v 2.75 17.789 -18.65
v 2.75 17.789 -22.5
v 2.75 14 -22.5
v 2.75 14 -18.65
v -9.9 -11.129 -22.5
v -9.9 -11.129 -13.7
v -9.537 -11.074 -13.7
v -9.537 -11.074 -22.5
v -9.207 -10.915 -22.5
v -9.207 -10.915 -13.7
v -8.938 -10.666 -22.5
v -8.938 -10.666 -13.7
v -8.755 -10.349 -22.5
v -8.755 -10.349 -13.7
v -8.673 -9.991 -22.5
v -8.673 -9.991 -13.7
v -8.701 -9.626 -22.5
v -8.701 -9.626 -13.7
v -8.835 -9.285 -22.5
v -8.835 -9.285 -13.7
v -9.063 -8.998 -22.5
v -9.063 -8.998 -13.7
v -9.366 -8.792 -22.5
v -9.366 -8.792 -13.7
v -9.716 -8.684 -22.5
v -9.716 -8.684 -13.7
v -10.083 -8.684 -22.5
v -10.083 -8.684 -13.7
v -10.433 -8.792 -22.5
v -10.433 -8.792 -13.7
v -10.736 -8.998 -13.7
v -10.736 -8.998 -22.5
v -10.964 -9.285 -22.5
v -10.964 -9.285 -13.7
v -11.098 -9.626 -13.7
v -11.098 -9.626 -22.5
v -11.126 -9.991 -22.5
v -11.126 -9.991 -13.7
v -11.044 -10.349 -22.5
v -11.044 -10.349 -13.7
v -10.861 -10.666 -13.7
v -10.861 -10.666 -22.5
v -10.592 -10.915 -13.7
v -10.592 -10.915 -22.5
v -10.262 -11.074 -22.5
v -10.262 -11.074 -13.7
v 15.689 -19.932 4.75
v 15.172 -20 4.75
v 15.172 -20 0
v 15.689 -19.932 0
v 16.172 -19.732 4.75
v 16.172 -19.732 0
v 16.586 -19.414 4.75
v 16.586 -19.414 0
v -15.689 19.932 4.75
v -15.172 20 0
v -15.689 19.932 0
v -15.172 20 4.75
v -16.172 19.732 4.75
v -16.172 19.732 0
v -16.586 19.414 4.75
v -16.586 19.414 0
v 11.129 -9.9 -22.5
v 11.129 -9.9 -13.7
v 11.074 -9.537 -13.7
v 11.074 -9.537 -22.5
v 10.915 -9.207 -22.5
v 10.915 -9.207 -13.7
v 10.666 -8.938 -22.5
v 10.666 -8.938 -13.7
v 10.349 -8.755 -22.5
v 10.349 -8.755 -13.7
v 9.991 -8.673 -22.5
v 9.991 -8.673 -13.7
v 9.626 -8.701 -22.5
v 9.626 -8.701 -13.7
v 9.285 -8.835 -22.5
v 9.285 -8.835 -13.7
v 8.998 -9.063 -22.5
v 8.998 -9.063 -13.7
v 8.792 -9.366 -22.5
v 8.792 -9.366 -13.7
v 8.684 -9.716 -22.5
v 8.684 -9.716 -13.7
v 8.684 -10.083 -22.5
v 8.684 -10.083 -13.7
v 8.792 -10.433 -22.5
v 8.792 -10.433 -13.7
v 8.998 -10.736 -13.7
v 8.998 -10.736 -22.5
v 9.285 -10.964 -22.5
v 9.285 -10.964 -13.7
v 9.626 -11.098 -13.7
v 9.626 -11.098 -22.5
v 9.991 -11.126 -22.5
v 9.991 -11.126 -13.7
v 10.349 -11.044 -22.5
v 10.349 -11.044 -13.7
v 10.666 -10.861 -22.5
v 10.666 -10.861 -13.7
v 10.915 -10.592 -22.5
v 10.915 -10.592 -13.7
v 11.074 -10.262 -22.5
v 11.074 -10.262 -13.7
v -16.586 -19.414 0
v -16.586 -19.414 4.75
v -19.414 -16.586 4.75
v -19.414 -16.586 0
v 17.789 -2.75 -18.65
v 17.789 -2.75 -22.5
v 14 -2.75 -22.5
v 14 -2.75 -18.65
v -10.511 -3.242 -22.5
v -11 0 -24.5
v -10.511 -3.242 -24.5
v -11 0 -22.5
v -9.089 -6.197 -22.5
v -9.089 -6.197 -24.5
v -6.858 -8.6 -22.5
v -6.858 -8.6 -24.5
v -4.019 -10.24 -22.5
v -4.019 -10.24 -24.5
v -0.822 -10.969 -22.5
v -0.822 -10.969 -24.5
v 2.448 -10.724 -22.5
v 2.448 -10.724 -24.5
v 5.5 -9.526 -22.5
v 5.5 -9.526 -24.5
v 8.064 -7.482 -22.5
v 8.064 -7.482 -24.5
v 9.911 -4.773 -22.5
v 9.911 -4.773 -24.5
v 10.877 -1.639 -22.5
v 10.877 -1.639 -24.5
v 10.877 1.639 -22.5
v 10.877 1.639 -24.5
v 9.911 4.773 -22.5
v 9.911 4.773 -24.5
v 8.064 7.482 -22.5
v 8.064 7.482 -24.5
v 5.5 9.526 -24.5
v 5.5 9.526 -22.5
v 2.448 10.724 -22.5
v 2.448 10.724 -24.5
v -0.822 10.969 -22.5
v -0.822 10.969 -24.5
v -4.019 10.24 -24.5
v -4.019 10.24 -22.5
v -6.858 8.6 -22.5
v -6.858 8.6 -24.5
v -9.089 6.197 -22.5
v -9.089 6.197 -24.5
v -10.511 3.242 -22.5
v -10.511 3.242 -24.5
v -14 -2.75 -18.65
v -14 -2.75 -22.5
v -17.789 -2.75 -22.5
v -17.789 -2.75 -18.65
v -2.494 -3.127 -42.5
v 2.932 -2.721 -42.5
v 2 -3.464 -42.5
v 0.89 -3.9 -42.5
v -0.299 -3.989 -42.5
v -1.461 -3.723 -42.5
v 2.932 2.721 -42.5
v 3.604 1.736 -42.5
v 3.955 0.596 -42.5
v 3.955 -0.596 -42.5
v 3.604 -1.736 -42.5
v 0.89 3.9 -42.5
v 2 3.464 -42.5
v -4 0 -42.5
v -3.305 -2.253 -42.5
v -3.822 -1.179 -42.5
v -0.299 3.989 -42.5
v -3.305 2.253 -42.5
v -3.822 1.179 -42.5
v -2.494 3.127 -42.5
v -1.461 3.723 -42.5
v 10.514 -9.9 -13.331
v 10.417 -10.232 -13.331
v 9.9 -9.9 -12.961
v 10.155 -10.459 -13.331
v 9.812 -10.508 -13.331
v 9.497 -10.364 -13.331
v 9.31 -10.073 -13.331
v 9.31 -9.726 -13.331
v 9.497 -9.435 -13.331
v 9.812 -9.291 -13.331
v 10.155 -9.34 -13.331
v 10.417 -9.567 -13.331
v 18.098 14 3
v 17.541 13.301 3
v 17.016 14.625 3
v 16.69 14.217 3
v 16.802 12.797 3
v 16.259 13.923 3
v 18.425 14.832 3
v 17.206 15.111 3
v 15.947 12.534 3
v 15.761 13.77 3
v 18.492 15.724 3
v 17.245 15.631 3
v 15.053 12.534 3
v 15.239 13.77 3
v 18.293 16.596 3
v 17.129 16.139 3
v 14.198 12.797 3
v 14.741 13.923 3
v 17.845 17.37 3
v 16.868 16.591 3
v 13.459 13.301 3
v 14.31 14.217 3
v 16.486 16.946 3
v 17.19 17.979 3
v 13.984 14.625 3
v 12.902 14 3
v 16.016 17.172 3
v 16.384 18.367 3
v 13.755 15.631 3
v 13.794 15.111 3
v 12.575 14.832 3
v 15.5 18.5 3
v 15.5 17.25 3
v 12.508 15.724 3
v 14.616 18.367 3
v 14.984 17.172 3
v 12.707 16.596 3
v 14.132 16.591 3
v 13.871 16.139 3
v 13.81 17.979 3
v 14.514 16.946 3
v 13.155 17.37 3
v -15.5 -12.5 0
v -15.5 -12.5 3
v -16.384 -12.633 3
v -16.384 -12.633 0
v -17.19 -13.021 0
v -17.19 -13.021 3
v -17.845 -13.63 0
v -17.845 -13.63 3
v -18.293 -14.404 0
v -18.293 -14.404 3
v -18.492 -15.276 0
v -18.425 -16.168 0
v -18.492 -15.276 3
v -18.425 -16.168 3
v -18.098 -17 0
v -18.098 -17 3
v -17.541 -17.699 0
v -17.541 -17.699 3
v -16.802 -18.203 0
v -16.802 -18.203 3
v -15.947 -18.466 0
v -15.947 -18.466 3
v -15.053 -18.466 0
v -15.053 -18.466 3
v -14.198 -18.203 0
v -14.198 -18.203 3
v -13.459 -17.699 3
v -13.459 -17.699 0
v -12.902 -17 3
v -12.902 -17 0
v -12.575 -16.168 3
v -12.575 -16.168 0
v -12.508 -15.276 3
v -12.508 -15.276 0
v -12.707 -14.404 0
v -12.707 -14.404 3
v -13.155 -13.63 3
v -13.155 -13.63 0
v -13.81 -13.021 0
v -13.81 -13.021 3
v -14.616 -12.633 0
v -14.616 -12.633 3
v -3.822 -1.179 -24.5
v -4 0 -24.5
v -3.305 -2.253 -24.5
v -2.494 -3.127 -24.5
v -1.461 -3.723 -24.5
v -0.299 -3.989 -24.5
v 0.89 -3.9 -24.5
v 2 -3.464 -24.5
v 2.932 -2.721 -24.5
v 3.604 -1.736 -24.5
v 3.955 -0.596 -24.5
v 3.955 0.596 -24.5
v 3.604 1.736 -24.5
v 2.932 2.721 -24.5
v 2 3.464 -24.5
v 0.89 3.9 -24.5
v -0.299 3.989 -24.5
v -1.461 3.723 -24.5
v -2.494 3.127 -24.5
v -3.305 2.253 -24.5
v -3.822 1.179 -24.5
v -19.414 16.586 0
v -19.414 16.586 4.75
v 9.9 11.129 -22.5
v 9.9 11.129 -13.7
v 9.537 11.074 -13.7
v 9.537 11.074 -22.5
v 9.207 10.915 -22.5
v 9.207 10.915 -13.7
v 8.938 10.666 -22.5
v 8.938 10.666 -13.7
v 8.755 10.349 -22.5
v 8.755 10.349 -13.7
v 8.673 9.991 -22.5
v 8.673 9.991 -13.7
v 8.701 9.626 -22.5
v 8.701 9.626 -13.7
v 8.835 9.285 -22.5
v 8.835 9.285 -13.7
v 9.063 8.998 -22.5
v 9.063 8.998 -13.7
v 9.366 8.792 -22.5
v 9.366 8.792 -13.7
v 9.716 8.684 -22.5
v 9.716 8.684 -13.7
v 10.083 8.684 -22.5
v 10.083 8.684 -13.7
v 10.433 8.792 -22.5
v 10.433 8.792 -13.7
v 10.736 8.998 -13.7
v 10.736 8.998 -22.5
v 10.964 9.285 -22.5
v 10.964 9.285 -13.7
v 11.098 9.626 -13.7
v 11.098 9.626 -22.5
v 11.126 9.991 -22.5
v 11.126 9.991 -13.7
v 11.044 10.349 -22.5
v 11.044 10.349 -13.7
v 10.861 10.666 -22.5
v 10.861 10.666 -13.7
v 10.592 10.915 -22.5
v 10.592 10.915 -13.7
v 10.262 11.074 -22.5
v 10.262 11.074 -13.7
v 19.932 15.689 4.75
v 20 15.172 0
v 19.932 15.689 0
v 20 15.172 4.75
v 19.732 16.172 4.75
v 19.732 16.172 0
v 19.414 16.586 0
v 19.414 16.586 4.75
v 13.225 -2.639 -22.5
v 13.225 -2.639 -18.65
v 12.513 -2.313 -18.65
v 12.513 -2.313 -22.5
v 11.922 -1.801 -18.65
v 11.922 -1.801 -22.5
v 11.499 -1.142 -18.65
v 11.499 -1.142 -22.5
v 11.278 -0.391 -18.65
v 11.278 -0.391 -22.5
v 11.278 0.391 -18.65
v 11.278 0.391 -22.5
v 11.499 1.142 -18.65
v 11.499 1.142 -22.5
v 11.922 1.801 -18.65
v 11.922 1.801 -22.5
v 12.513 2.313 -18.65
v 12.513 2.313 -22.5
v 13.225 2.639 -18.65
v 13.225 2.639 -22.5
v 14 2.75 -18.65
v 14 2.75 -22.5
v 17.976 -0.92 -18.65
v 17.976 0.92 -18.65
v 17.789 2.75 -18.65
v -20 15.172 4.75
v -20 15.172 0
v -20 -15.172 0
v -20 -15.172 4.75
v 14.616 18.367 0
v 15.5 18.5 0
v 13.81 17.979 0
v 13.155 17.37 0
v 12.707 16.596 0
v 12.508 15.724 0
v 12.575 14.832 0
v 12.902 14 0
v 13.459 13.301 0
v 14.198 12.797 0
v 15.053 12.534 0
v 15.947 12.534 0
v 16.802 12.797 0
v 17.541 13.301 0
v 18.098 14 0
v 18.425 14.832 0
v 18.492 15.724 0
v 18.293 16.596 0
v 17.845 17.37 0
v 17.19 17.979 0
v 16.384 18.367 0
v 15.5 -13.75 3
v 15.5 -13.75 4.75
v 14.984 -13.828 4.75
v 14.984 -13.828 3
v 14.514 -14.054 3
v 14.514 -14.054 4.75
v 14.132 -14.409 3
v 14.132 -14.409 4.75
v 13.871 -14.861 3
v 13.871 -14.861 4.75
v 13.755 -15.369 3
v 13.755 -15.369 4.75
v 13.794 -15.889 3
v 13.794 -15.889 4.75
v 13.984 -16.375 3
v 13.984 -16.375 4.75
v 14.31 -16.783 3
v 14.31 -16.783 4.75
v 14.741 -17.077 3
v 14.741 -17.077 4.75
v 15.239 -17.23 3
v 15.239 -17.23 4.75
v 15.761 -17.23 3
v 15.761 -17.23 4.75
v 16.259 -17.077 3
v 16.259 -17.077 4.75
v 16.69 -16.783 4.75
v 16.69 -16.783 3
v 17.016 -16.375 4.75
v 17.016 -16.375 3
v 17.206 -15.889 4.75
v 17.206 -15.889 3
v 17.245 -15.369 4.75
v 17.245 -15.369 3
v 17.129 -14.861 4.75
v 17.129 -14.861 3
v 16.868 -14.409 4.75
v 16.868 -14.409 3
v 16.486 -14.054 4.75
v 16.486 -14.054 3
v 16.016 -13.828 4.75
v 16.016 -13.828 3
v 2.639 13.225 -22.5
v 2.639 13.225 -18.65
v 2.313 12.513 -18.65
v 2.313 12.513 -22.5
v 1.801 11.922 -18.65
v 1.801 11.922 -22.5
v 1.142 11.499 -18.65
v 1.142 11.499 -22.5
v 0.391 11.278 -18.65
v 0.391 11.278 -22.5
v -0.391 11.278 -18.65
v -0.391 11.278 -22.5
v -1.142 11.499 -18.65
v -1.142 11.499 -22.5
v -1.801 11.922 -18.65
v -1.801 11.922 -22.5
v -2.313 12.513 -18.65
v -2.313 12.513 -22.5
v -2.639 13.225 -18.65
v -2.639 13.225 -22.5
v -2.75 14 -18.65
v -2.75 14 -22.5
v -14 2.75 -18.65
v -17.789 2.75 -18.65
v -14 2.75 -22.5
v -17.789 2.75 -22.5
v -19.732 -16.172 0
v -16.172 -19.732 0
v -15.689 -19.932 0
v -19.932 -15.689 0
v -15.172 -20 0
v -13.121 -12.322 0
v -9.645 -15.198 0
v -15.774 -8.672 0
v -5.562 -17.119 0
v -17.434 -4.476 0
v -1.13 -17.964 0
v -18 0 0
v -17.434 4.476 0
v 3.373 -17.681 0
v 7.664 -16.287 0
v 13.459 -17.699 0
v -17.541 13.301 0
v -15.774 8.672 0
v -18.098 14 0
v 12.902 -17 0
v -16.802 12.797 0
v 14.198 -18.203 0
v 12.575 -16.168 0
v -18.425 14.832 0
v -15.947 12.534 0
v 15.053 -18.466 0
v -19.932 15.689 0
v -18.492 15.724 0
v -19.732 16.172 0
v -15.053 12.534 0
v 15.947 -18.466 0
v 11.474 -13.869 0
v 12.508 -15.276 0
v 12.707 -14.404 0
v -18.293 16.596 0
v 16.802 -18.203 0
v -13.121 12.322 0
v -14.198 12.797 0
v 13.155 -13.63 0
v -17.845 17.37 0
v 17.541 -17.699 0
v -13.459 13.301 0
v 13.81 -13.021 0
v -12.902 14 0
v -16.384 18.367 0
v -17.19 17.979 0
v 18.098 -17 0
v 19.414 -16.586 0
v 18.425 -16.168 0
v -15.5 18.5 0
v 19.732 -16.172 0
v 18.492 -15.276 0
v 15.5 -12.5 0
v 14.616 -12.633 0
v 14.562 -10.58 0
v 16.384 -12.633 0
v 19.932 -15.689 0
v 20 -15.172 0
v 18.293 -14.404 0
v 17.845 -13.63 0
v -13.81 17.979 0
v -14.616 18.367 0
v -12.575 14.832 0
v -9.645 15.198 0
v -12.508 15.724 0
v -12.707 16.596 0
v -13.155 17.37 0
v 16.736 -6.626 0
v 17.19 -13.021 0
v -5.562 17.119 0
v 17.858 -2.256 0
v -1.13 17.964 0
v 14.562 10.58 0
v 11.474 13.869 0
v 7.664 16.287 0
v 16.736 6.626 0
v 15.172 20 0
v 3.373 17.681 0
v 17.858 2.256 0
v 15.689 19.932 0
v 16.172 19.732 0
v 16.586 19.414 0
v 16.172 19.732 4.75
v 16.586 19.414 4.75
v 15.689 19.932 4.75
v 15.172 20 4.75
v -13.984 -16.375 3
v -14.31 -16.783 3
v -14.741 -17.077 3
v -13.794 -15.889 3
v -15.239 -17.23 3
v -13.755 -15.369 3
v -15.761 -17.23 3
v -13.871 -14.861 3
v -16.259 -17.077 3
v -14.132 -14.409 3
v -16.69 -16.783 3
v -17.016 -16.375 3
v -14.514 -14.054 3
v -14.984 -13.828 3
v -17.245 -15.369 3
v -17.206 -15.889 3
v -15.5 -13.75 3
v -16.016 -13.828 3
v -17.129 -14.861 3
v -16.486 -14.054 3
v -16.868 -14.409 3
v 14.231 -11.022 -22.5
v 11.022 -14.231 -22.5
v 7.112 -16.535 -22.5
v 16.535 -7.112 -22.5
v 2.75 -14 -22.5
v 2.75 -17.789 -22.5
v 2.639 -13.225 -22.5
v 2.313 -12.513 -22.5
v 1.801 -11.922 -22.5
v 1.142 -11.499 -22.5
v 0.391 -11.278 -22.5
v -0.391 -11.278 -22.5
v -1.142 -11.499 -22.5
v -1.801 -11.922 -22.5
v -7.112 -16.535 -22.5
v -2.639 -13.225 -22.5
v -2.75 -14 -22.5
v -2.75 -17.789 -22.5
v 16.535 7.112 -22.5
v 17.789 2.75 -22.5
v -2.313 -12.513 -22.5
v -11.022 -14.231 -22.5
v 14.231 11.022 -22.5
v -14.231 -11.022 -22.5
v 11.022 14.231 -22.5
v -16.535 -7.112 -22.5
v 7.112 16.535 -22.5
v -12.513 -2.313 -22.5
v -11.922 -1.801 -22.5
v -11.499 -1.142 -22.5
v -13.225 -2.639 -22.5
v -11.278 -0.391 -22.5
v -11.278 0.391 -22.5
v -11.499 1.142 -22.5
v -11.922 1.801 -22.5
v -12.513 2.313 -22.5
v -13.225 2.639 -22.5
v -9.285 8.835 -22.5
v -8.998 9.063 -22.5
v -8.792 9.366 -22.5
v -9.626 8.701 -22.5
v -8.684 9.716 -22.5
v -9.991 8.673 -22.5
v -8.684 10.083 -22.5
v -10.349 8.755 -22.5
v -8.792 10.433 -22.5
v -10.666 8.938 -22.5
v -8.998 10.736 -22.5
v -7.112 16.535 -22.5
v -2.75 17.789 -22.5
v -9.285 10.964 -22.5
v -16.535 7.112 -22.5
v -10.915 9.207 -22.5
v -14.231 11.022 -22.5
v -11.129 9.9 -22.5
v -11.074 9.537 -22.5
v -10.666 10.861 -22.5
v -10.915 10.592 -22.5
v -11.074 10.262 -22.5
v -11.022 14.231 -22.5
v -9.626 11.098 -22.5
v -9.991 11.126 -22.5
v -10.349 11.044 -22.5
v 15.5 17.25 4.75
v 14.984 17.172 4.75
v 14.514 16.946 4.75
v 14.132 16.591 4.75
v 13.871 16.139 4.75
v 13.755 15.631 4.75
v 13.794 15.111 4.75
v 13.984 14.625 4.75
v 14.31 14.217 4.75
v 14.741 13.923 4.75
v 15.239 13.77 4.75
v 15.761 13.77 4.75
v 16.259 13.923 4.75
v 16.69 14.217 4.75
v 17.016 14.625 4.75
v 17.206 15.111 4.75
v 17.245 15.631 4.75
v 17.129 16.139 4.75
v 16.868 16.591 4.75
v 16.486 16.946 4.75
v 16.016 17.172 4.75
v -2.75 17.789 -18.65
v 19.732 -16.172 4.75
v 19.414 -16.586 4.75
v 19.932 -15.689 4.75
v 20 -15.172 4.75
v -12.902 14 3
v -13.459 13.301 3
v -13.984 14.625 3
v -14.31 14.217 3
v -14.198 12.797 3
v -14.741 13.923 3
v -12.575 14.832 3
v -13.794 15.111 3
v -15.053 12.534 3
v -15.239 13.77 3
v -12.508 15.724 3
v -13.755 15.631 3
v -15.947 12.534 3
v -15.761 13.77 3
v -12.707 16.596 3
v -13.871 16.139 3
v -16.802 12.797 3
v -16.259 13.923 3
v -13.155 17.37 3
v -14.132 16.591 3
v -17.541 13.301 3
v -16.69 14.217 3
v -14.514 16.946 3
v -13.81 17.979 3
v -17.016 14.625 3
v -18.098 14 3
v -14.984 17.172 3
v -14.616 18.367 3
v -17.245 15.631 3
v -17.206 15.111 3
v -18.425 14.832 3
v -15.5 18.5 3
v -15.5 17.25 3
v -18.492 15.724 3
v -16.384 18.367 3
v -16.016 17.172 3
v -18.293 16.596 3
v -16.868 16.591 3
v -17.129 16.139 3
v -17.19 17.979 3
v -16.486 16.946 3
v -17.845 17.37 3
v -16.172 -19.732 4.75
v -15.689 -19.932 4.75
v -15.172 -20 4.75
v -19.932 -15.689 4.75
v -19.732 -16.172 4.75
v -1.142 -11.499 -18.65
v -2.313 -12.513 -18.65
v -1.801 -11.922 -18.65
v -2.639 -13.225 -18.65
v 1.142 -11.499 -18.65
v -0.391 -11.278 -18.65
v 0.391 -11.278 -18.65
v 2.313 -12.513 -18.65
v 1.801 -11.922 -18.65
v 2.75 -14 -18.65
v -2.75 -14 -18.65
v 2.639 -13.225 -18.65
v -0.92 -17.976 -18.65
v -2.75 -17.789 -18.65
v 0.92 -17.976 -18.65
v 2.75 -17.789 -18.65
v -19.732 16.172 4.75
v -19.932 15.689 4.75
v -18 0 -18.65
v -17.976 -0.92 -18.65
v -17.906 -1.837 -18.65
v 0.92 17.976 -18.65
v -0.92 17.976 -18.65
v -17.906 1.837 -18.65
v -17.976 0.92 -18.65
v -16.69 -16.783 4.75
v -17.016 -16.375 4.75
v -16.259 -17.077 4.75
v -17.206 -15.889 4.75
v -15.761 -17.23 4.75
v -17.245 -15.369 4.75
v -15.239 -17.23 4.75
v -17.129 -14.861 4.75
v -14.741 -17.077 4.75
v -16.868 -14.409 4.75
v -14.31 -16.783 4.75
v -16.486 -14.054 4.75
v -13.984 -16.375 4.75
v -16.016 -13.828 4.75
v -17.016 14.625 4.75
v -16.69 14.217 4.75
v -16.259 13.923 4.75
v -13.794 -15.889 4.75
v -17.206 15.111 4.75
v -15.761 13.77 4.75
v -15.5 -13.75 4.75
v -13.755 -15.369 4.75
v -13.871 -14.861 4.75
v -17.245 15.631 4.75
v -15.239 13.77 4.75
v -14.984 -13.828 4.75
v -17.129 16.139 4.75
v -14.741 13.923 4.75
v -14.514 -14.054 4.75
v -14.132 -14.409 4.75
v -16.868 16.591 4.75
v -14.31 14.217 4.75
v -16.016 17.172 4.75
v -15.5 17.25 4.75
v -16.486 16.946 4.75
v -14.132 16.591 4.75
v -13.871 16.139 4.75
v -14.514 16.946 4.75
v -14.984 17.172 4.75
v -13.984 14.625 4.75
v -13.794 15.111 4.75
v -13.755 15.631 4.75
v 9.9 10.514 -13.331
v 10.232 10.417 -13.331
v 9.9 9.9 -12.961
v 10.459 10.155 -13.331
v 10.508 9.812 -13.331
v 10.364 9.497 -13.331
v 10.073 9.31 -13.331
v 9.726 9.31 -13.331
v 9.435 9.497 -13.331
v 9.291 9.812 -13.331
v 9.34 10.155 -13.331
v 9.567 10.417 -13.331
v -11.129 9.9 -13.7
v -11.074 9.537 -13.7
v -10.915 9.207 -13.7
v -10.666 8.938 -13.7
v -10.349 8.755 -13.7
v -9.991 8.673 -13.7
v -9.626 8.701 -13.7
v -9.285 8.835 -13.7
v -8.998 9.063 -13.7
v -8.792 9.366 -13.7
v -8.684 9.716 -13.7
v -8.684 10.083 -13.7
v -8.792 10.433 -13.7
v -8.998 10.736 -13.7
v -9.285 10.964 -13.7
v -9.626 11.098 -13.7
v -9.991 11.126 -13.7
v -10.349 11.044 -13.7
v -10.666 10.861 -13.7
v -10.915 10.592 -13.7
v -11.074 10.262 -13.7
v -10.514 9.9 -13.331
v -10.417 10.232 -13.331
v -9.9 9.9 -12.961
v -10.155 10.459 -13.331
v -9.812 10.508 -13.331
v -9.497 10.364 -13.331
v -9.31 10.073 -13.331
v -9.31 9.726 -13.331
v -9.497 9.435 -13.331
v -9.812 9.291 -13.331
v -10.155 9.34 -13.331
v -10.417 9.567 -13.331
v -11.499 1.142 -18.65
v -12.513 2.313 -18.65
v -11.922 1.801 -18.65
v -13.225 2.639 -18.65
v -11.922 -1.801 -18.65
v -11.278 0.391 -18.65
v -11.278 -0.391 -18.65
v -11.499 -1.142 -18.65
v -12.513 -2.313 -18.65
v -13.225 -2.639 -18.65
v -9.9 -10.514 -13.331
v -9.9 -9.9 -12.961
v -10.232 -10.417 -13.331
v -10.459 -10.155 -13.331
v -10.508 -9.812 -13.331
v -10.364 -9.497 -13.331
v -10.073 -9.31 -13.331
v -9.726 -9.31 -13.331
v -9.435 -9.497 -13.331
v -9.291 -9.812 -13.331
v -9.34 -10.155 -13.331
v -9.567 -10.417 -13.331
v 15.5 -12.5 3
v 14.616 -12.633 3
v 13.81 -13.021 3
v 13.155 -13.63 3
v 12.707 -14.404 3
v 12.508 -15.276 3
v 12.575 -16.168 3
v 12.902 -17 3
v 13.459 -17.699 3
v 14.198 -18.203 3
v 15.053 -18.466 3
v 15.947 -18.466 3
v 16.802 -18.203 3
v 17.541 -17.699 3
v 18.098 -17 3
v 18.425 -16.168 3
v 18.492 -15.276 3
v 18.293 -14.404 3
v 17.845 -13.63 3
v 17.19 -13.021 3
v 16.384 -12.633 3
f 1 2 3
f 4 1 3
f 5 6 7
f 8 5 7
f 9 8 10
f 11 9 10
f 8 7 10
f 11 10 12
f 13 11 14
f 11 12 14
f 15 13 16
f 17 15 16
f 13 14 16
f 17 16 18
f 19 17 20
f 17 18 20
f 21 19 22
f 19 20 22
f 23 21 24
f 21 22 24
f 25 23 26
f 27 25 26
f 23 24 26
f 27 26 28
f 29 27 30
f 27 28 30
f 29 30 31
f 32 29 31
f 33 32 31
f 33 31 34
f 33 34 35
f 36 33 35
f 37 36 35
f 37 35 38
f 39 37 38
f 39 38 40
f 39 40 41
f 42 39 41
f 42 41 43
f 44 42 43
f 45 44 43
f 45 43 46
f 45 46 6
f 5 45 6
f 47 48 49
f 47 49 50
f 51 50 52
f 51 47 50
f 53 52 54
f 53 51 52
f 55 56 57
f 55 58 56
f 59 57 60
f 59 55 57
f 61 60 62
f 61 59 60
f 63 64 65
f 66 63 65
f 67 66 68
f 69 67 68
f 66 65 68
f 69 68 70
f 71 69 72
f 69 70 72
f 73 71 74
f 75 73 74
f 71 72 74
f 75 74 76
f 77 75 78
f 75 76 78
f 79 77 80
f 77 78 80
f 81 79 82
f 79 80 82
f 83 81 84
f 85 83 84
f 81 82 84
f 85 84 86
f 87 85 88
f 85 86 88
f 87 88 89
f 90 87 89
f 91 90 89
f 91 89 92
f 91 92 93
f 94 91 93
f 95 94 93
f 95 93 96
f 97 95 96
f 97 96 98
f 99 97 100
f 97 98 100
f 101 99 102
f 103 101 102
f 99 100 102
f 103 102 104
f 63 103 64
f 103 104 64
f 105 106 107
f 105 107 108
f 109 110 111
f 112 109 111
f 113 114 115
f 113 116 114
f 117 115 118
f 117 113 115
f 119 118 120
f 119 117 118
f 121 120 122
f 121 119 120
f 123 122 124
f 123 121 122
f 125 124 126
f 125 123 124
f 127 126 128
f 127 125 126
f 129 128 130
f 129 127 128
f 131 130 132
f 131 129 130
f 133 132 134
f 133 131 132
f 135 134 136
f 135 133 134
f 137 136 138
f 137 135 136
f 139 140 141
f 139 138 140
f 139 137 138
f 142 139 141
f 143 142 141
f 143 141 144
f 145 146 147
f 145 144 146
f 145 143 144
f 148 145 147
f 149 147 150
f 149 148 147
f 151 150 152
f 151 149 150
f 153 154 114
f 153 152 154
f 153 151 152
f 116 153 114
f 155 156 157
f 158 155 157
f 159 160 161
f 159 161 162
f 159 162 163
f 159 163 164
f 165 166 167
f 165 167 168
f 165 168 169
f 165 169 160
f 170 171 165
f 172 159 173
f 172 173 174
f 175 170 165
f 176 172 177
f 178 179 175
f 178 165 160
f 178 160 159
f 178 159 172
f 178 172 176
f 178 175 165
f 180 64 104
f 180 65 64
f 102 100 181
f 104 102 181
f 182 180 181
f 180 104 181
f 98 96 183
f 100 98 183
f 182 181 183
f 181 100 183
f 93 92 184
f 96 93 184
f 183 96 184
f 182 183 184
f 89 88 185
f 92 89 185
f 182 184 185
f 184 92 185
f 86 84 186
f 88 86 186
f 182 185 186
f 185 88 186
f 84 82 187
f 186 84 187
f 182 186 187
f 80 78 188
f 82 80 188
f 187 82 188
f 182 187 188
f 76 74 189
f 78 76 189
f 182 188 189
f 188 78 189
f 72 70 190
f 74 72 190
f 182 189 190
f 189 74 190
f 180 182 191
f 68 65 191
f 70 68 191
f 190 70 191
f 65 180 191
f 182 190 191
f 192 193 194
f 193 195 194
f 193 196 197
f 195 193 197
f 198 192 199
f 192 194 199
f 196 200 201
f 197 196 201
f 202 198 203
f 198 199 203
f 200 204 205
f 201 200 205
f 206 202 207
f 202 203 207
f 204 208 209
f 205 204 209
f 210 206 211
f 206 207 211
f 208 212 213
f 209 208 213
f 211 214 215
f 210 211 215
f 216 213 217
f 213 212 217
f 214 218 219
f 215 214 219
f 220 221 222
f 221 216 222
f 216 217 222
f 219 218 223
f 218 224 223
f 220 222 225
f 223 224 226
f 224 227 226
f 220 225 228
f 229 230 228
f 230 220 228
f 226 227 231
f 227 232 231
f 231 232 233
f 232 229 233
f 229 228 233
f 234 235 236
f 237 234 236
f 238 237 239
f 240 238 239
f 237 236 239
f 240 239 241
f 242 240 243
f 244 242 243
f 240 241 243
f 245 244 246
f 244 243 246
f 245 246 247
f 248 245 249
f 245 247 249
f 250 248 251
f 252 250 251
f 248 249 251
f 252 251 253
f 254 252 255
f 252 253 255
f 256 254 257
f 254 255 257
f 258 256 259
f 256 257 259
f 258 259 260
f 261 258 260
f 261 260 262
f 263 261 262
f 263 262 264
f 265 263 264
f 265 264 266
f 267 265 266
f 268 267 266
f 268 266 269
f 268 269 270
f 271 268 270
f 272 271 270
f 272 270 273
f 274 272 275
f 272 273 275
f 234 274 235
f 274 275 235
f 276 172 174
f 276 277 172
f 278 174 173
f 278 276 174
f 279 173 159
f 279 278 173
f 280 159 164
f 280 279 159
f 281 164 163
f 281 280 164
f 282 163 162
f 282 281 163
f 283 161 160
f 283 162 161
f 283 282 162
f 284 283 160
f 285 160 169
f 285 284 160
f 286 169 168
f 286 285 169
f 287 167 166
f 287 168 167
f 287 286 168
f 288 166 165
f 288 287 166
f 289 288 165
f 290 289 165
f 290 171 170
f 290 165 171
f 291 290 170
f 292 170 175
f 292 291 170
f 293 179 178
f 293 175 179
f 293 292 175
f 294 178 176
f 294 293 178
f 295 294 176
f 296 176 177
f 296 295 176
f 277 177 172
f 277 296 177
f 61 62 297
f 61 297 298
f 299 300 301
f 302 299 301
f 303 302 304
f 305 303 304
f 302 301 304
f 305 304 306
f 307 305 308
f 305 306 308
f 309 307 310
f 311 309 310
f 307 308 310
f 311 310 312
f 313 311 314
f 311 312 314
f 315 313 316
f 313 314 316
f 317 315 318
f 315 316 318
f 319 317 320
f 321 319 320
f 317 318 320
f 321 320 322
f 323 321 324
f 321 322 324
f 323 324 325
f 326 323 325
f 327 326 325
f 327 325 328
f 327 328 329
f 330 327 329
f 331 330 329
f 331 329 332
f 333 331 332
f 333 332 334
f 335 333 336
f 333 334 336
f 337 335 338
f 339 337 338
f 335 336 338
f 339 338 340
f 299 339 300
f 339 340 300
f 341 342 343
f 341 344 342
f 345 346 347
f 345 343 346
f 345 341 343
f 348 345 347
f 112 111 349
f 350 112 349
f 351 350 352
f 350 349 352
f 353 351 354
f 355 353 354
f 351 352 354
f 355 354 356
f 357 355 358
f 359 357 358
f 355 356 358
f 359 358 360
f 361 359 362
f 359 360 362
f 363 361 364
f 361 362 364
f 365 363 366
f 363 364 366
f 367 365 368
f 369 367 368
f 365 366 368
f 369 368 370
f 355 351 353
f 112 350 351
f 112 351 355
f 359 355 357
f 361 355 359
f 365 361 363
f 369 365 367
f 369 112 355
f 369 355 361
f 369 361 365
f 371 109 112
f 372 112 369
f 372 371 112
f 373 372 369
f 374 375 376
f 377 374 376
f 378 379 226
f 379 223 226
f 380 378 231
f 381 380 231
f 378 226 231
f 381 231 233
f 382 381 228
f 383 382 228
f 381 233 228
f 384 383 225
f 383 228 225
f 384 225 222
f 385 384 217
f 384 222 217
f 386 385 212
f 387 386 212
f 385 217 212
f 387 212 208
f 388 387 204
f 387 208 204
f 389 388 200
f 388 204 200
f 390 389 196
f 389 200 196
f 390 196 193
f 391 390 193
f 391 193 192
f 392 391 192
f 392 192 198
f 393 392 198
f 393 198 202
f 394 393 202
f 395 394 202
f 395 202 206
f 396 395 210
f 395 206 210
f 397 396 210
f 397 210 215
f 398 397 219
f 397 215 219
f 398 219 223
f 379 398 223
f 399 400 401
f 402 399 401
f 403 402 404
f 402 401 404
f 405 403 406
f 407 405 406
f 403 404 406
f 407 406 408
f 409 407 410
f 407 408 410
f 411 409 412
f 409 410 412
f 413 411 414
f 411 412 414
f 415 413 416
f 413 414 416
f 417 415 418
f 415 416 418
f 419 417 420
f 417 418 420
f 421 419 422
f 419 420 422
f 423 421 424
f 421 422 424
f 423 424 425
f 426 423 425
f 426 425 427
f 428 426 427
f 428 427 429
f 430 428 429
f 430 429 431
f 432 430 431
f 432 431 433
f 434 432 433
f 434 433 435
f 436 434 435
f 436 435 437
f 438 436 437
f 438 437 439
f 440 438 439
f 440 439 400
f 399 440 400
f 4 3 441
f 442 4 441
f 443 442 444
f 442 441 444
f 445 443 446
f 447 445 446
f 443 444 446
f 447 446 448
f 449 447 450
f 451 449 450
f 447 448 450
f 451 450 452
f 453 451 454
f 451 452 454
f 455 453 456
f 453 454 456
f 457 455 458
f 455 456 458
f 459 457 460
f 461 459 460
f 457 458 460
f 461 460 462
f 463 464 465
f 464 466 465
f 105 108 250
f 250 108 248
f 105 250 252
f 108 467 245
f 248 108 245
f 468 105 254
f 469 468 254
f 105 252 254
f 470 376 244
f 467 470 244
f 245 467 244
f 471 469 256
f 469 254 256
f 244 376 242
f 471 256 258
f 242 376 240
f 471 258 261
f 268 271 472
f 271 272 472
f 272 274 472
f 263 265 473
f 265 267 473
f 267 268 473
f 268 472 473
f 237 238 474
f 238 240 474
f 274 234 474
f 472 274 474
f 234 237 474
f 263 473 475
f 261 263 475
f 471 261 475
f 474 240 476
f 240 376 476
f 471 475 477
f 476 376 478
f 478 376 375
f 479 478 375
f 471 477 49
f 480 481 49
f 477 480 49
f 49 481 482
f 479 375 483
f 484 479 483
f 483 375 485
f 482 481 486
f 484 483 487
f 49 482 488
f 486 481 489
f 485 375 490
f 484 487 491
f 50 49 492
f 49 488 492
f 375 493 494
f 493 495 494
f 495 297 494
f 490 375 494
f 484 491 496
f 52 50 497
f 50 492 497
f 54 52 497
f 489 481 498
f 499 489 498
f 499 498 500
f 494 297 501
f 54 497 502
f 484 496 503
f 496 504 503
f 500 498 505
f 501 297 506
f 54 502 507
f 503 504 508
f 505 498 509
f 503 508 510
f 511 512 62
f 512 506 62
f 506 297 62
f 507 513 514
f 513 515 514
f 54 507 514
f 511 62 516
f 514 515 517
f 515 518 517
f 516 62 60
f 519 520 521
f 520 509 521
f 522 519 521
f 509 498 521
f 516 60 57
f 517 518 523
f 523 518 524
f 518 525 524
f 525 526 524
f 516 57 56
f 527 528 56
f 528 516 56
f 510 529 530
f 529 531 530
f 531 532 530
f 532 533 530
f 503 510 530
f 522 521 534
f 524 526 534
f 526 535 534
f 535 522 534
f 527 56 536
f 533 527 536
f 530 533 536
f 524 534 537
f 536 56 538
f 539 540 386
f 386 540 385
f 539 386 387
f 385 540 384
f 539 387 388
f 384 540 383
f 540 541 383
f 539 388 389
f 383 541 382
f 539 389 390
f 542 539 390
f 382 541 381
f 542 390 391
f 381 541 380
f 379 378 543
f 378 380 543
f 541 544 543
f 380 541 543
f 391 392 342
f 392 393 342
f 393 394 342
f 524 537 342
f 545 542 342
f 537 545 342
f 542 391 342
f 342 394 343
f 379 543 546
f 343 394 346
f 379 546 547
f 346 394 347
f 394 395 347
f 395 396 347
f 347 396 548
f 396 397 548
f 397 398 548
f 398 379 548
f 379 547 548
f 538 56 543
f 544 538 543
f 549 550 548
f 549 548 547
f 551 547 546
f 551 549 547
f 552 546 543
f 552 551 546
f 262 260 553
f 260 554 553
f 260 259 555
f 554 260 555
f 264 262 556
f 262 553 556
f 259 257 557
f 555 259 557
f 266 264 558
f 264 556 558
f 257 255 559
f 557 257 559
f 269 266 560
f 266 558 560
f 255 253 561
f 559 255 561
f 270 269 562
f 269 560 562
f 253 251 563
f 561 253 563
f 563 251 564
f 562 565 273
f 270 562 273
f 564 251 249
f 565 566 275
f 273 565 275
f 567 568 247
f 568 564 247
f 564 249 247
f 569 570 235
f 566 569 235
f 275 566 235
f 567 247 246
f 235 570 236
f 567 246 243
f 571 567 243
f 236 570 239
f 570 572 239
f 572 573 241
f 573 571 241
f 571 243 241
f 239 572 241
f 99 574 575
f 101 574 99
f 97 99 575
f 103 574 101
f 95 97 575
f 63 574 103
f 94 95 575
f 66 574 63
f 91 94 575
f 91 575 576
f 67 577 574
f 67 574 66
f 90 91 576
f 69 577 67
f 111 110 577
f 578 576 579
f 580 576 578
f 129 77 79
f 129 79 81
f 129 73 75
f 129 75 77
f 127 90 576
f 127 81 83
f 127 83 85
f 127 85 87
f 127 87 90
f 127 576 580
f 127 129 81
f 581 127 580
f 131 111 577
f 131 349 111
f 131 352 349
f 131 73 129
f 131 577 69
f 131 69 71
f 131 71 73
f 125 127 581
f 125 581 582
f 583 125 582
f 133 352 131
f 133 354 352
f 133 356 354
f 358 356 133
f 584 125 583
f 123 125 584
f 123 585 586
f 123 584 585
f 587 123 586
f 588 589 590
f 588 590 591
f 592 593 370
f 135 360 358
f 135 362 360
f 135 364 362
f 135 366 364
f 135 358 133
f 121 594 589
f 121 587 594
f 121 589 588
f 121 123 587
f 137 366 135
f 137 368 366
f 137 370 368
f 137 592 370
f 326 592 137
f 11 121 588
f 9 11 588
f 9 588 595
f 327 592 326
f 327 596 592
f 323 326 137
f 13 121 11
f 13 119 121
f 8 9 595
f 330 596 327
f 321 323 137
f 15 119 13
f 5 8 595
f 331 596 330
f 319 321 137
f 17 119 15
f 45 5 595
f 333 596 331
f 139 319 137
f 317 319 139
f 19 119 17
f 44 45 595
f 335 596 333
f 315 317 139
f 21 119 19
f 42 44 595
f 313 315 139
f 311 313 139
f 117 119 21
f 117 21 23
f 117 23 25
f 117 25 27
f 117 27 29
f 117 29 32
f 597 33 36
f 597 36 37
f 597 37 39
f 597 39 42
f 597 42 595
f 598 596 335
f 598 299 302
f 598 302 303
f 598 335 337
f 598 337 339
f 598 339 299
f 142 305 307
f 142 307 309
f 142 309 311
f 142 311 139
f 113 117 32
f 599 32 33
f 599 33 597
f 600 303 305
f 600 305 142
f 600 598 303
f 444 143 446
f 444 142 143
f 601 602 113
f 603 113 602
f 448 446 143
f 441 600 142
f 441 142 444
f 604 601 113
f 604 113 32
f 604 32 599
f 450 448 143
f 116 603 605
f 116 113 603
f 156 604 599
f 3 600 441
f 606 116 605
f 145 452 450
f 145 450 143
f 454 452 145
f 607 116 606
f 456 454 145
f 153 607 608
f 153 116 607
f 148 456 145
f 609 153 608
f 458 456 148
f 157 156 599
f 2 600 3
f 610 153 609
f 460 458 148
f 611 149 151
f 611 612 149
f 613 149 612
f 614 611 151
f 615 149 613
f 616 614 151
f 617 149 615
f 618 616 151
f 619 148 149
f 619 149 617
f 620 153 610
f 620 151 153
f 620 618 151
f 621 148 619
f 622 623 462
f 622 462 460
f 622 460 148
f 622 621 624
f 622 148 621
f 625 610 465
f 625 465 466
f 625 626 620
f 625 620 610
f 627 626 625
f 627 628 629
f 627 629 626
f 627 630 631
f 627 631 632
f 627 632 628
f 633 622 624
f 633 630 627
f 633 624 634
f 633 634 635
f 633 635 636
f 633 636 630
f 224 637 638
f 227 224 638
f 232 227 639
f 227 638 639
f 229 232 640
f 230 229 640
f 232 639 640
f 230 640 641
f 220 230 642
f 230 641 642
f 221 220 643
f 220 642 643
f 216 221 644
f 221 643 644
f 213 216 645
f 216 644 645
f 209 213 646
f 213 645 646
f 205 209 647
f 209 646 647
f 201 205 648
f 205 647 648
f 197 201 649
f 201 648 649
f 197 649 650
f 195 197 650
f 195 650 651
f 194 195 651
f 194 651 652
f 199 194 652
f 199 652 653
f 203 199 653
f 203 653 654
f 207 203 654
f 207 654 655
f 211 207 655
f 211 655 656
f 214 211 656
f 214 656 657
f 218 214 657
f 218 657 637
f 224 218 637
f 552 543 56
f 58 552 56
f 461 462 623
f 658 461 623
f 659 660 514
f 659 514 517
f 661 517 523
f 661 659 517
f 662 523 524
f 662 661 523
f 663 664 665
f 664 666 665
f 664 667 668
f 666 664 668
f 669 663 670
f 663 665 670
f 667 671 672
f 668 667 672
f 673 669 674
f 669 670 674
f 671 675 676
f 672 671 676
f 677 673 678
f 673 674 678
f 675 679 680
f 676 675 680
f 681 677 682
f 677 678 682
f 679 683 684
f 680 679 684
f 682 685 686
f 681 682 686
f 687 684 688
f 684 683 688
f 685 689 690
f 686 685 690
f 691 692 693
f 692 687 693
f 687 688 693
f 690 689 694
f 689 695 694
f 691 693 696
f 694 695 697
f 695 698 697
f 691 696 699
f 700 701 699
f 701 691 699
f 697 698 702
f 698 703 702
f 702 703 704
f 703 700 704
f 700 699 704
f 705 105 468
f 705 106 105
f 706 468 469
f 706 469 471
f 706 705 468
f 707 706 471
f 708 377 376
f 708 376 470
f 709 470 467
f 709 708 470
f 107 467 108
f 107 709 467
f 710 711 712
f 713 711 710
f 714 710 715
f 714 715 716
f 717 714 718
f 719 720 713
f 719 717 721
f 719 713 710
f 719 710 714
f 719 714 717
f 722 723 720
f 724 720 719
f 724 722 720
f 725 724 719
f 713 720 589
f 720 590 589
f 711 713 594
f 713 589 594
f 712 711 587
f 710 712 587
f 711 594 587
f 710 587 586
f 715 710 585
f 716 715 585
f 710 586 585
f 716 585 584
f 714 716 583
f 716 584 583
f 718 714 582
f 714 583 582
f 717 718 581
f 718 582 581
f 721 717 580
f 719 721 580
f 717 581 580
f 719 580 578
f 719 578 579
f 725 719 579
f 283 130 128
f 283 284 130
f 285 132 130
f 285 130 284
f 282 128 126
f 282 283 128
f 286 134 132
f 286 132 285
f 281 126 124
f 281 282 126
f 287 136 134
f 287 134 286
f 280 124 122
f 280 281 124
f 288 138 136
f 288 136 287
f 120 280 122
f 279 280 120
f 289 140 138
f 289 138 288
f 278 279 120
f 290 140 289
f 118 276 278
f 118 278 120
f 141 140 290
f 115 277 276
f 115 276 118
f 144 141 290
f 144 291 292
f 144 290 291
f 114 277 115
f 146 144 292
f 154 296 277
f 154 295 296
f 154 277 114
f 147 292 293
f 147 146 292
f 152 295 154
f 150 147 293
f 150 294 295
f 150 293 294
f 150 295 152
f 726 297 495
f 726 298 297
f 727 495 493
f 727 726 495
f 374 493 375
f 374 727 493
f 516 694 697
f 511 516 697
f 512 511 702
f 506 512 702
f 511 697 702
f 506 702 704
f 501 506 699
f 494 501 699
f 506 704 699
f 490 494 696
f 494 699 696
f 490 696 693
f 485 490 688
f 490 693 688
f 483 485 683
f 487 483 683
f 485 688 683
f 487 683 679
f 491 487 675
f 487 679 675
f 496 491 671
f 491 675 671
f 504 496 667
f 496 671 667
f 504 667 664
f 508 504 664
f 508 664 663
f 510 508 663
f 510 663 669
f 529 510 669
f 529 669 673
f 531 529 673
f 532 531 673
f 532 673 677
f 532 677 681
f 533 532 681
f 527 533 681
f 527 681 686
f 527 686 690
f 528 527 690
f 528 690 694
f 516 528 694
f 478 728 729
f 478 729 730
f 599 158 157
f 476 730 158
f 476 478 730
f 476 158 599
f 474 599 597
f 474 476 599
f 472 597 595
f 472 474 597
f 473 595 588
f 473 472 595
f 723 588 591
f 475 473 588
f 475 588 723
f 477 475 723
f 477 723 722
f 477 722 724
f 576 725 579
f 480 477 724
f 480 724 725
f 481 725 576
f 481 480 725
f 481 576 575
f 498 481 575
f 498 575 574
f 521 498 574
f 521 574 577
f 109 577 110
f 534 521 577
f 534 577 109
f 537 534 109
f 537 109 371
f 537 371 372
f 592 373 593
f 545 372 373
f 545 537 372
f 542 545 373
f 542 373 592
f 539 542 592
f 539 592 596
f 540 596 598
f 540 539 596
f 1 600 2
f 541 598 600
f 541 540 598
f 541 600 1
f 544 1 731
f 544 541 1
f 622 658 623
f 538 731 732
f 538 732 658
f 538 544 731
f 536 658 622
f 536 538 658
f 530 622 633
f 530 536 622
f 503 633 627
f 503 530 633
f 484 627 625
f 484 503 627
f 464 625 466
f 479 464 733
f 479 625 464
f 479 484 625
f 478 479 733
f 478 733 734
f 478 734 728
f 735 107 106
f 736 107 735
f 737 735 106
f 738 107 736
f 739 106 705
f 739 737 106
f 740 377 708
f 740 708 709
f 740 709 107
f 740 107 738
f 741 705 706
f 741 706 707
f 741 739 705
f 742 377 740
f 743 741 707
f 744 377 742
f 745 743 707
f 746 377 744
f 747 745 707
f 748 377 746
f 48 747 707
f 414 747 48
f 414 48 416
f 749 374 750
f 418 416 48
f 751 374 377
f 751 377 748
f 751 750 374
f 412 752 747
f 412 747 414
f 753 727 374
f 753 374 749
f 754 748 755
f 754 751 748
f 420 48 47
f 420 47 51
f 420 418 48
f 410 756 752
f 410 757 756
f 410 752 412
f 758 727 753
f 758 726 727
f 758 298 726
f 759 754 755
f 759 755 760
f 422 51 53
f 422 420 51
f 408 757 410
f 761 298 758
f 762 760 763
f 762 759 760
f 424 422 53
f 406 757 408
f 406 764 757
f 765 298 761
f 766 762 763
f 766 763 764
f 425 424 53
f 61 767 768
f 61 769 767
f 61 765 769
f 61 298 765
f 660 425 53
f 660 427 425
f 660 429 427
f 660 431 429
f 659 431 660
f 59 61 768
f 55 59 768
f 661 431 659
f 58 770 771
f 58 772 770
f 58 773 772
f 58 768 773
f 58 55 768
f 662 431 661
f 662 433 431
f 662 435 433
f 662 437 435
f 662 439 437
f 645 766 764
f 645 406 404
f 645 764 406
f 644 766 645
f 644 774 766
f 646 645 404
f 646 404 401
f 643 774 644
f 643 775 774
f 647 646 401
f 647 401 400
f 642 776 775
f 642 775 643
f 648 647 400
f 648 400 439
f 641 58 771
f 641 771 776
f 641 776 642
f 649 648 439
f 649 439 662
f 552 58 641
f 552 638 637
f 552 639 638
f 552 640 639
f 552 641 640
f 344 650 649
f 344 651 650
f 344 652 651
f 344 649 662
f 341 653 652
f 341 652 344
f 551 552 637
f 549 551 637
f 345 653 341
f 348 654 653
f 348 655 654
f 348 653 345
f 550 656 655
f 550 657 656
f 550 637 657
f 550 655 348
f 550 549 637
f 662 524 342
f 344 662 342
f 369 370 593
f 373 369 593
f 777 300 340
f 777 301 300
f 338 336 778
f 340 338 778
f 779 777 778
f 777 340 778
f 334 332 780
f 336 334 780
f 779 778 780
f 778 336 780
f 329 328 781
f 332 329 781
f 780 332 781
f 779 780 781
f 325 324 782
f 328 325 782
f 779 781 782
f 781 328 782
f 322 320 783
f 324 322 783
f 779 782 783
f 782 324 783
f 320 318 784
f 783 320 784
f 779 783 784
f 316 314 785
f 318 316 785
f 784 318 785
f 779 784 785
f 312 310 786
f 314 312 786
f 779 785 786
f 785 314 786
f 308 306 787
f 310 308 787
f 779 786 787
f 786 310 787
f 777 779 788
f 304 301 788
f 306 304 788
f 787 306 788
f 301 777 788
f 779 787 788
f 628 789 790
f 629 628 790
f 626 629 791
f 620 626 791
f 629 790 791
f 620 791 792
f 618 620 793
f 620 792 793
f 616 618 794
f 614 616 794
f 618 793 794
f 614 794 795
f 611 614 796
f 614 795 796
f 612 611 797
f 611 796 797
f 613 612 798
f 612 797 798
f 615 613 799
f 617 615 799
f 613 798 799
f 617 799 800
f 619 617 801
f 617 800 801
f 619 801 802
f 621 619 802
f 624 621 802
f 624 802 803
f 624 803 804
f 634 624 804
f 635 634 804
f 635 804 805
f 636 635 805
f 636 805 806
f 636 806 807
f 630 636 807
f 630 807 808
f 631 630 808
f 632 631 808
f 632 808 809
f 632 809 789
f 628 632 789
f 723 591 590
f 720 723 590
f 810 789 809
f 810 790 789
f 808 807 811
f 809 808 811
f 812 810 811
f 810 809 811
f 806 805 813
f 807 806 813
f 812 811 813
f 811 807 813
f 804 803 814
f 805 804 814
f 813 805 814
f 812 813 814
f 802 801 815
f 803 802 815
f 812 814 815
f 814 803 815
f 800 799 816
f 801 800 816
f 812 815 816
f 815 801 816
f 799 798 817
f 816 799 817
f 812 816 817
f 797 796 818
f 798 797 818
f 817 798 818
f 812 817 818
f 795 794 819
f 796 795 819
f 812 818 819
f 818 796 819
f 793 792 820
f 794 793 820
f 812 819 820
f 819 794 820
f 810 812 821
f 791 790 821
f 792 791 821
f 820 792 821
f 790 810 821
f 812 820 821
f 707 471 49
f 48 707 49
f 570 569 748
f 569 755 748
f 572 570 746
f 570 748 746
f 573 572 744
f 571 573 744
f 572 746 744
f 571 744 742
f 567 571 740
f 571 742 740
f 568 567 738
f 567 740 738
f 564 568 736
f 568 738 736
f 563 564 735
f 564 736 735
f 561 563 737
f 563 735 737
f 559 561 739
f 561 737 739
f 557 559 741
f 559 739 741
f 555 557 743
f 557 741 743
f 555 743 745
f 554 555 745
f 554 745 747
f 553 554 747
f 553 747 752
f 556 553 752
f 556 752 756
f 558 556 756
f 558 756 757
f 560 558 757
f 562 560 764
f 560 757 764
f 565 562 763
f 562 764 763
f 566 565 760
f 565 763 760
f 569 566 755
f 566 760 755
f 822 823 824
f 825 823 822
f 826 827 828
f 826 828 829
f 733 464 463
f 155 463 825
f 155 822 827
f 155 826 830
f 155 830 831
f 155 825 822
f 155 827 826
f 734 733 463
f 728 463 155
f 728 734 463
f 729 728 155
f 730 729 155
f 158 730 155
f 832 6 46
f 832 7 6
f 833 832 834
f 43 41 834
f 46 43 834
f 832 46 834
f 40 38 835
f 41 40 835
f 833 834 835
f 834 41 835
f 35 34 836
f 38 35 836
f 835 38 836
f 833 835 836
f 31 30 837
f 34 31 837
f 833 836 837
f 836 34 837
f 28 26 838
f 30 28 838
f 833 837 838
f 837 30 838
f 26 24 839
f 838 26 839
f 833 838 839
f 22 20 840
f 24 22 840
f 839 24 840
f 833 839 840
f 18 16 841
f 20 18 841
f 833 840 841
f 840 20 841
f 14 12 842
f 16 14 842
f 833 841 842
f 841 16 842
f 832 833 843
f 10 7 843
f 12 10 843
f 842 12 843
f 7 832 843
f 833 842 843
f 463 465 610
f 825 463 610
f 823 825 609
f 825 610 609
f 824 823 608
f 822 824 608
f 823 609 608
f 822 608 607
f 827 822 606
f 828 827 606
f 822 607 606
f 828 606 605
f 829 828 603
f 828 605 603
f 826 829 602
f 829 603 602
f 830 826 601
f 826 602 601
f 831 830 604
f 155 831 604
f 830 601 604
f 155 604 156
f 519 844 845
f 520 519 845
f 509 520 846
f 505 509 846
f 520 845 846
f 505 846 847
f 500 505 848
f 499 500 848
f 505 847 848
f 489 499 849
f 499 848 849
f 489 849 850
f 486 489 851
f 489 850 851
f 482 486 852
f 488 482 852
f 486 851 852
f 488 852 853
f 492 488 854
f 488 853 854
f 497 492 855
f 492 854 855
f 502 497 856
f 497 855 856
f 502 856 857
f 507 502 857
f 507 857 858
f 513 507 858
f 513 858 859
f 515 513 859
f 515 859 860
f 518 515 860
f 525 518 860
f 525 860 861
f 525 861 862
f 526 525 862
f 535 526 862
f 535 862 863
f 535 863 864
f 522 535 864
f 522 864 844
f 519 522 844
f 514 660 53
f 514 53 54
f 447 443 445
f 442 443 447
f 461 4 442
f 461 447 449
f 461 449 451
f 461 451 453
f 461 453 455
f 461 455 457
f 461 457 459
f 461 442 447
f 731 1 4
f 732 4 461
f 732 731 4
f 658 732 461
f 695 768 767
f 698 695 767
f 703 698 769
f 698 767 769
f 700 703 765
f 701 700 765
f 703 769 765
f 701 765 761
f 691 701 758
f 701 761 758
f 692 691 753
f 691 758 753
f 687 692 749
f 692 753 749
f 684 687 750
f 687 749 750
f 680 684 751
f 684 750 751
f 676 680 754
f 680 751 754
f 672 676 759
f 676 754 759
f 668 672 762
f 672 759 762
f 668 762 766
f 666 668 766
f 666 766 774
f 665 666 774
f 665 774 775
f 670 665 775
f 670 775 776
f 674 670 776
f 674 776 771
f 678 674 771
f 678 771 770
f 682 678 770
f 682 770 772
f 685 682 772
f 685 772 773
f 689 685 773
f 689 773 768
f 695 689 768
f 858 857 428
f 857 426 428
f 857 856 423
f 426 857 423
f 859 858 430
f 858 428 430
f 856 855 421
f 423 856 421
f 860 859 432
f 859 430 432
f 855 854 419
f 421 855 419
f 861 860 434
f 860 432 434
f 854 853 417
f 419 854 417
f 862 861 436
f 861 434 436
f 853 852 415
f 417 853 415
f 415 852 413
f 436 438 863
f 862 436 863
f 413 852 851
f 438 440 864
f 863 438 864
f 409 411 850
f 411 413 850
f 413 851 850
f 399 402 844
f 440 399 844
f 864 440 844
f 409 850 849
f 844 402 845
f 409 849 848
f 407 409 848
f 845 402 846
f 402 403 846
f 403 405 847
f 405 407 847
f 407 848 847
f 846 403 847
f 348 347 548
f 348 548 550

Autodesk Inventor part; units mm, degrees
ref_plane "YZ Plane" through (0, 0, 0) normal (1, 0, 0) x (0, 1, 0)
ref_plane "XZ Plane" through (0, 0, 0) normal (0, 1, 0) x (-1, 0, 0)
ref_plane "XY Plane" through (0, 0, 0) normal (0, 0, 1) x (1, 0, 0)
sketch "Esquisse1" plane through (0, 0, 0) normal (0, 0, 1) x (1, 0, 0)
  line L0 (-20, -20) -> (20, -20)
  line L1 (20, -20) -> (20, 20)
  line L2 (20, 20) -> (-20, 20)
  line L3 (-20, 20) -> (-20, -20)
  line L4 (-20, -20) -> (20, 20) construction
  line L5 (20, -20) -> (-20, 20) construction
  point P0 (0, 0)
  dimension "d0" = 40
  dimension "d1" = 40
extrude "Extrusion1" add sketch "Esquisse1" along normal blind 4.75
sketch "Esquisse2" plane through (0, 0, 0) normal (0, 0, -1) x (-1, 0, 0)
  circle A0 centre (0, 0) radius 18
  dimension "d4" = 36
extrude "Extrusion2" add sketch "Esquisse2" along normal blind 22.5
sketch "Esquisse3" plane through (0, 0, -22.5) normal (0, 0, -1) x (-1, 0, 0)
  circle A0 centre (0, 0) radius 11
  dimension "d7" = 22
extrude "Extrusion3" add sketch "Esquisse3" along normal blind 2
sketch "Esquisse4" plane through (0, 0, -24.5) normal (0, 0, -1) x (-1, 0, 0)
  circle A0 centre (0, 0) radius 4
  dimension "d10" = 8
extrude "Extrusion4" add sketch "Esquisse4" along normal blind 18
sketch "Esquisse5" plane through (0, 0, -22.5) normal (0, 0, -1) x (-1, 0, 0)
  line L0 (2.75, 14) -> (2.75, 20)
  line L1 (2.75, 20) -> (-2.75, 20)
  line L2 (-2.75, 20) -> (-2.75, 14)
  arc A0 (-2.75, 14) -> (2.75, 14) centre (0, 14) ccw
  line L3 (-5.8727, 11.25) -> (6.9121, 11.25) construction
  line L4 (-20, 20) -> (20, 20) construction
  point P0 (0, 0)
  dimension "d13" = 5.5
  dimension "d14" = 11.25
extrude "Extrusion5" cut sketch "Esquisse5" against normal blind 3.85
pattern_circular "Réseau circulaire1" count 4 over 360 about axis through (0, 0, 0) along (0, 0, -1) of "Extrusion5"
sketch "Esquisse6" plane through (0, 0, -22.5) normal (0, 0, -1) x (-1, 0, 0)
  circle A0 centre (0, 0) radius 14 construction
  circle A1 centre (0, 0) radius 11 construction
  line L0 (0, 0) -> (-20.9292, 20.9292) construction
  line L1 (28, 0) -> (-28, 0) construction
  point P0 (-9.8995, 9.8995)
  dimension "d20" = 28
  dimension "d21" = 45
hole "Perçage1" at (9.8995, 9.8995, -22.5) direction (0, 0, 1) diameter 2.459 depth 8.8 tip angle 118 thread size "M3x0.5" class "6H" standard "ISO Metric profile"
pattern_circular "Réseau circulaire2" count 4 over 360 about axis through (0, 0, 0) along (0, 0, -1) of "Perçage1"
sketch "Esquisse7" plane through (0, 0, 0) normal (0, 0, -1) x (-1, 0, 0)
  point P0 (0, 0)
  point P1 (15.5, 15.5)
  point P2 (15.5, -15.5)
  point P3 (-15.5, -15.5)
  point P4 (-15.5, 15.5)
  dimension "d32" = 31
  dimension "d33" = 31
  dimension "d34" = 15.5
  dimension "d35" = 15.5
hole "Perçage2" at (-15.5, 15.5, 0) at (-15.5, -15.5, 0) at (15.5, -15.5, 0) at (15.5, 15.5, 0) direction (0, 0, 1) diameter 3.5 end through all counterbore diameter 6 counterbore depth 3
chamfer "Chanfrein1" distance 4 angle 45 4 edges at (-20, -20, 2.375) (20, -20, 2.375) (20, 20, 2.375) (-20, 20, 2.375)
fillet "Congé1" radius 2 8 edges at (-16, -20, 2.375) (16, -20, 2.375) (20, -16, 2.375) (20, 16, 2.375) (16, 20, 2.375) (-16, 20, 2.375) (-20, 16, 2.375) (-20, -16, 2.375)
equation "\"d33\" = d32"
equation "\"d34\" = 0.5 * d32"
equation "\"d35\" = 0.5 * d33"
properties part number "Reducteur" material "----------"
